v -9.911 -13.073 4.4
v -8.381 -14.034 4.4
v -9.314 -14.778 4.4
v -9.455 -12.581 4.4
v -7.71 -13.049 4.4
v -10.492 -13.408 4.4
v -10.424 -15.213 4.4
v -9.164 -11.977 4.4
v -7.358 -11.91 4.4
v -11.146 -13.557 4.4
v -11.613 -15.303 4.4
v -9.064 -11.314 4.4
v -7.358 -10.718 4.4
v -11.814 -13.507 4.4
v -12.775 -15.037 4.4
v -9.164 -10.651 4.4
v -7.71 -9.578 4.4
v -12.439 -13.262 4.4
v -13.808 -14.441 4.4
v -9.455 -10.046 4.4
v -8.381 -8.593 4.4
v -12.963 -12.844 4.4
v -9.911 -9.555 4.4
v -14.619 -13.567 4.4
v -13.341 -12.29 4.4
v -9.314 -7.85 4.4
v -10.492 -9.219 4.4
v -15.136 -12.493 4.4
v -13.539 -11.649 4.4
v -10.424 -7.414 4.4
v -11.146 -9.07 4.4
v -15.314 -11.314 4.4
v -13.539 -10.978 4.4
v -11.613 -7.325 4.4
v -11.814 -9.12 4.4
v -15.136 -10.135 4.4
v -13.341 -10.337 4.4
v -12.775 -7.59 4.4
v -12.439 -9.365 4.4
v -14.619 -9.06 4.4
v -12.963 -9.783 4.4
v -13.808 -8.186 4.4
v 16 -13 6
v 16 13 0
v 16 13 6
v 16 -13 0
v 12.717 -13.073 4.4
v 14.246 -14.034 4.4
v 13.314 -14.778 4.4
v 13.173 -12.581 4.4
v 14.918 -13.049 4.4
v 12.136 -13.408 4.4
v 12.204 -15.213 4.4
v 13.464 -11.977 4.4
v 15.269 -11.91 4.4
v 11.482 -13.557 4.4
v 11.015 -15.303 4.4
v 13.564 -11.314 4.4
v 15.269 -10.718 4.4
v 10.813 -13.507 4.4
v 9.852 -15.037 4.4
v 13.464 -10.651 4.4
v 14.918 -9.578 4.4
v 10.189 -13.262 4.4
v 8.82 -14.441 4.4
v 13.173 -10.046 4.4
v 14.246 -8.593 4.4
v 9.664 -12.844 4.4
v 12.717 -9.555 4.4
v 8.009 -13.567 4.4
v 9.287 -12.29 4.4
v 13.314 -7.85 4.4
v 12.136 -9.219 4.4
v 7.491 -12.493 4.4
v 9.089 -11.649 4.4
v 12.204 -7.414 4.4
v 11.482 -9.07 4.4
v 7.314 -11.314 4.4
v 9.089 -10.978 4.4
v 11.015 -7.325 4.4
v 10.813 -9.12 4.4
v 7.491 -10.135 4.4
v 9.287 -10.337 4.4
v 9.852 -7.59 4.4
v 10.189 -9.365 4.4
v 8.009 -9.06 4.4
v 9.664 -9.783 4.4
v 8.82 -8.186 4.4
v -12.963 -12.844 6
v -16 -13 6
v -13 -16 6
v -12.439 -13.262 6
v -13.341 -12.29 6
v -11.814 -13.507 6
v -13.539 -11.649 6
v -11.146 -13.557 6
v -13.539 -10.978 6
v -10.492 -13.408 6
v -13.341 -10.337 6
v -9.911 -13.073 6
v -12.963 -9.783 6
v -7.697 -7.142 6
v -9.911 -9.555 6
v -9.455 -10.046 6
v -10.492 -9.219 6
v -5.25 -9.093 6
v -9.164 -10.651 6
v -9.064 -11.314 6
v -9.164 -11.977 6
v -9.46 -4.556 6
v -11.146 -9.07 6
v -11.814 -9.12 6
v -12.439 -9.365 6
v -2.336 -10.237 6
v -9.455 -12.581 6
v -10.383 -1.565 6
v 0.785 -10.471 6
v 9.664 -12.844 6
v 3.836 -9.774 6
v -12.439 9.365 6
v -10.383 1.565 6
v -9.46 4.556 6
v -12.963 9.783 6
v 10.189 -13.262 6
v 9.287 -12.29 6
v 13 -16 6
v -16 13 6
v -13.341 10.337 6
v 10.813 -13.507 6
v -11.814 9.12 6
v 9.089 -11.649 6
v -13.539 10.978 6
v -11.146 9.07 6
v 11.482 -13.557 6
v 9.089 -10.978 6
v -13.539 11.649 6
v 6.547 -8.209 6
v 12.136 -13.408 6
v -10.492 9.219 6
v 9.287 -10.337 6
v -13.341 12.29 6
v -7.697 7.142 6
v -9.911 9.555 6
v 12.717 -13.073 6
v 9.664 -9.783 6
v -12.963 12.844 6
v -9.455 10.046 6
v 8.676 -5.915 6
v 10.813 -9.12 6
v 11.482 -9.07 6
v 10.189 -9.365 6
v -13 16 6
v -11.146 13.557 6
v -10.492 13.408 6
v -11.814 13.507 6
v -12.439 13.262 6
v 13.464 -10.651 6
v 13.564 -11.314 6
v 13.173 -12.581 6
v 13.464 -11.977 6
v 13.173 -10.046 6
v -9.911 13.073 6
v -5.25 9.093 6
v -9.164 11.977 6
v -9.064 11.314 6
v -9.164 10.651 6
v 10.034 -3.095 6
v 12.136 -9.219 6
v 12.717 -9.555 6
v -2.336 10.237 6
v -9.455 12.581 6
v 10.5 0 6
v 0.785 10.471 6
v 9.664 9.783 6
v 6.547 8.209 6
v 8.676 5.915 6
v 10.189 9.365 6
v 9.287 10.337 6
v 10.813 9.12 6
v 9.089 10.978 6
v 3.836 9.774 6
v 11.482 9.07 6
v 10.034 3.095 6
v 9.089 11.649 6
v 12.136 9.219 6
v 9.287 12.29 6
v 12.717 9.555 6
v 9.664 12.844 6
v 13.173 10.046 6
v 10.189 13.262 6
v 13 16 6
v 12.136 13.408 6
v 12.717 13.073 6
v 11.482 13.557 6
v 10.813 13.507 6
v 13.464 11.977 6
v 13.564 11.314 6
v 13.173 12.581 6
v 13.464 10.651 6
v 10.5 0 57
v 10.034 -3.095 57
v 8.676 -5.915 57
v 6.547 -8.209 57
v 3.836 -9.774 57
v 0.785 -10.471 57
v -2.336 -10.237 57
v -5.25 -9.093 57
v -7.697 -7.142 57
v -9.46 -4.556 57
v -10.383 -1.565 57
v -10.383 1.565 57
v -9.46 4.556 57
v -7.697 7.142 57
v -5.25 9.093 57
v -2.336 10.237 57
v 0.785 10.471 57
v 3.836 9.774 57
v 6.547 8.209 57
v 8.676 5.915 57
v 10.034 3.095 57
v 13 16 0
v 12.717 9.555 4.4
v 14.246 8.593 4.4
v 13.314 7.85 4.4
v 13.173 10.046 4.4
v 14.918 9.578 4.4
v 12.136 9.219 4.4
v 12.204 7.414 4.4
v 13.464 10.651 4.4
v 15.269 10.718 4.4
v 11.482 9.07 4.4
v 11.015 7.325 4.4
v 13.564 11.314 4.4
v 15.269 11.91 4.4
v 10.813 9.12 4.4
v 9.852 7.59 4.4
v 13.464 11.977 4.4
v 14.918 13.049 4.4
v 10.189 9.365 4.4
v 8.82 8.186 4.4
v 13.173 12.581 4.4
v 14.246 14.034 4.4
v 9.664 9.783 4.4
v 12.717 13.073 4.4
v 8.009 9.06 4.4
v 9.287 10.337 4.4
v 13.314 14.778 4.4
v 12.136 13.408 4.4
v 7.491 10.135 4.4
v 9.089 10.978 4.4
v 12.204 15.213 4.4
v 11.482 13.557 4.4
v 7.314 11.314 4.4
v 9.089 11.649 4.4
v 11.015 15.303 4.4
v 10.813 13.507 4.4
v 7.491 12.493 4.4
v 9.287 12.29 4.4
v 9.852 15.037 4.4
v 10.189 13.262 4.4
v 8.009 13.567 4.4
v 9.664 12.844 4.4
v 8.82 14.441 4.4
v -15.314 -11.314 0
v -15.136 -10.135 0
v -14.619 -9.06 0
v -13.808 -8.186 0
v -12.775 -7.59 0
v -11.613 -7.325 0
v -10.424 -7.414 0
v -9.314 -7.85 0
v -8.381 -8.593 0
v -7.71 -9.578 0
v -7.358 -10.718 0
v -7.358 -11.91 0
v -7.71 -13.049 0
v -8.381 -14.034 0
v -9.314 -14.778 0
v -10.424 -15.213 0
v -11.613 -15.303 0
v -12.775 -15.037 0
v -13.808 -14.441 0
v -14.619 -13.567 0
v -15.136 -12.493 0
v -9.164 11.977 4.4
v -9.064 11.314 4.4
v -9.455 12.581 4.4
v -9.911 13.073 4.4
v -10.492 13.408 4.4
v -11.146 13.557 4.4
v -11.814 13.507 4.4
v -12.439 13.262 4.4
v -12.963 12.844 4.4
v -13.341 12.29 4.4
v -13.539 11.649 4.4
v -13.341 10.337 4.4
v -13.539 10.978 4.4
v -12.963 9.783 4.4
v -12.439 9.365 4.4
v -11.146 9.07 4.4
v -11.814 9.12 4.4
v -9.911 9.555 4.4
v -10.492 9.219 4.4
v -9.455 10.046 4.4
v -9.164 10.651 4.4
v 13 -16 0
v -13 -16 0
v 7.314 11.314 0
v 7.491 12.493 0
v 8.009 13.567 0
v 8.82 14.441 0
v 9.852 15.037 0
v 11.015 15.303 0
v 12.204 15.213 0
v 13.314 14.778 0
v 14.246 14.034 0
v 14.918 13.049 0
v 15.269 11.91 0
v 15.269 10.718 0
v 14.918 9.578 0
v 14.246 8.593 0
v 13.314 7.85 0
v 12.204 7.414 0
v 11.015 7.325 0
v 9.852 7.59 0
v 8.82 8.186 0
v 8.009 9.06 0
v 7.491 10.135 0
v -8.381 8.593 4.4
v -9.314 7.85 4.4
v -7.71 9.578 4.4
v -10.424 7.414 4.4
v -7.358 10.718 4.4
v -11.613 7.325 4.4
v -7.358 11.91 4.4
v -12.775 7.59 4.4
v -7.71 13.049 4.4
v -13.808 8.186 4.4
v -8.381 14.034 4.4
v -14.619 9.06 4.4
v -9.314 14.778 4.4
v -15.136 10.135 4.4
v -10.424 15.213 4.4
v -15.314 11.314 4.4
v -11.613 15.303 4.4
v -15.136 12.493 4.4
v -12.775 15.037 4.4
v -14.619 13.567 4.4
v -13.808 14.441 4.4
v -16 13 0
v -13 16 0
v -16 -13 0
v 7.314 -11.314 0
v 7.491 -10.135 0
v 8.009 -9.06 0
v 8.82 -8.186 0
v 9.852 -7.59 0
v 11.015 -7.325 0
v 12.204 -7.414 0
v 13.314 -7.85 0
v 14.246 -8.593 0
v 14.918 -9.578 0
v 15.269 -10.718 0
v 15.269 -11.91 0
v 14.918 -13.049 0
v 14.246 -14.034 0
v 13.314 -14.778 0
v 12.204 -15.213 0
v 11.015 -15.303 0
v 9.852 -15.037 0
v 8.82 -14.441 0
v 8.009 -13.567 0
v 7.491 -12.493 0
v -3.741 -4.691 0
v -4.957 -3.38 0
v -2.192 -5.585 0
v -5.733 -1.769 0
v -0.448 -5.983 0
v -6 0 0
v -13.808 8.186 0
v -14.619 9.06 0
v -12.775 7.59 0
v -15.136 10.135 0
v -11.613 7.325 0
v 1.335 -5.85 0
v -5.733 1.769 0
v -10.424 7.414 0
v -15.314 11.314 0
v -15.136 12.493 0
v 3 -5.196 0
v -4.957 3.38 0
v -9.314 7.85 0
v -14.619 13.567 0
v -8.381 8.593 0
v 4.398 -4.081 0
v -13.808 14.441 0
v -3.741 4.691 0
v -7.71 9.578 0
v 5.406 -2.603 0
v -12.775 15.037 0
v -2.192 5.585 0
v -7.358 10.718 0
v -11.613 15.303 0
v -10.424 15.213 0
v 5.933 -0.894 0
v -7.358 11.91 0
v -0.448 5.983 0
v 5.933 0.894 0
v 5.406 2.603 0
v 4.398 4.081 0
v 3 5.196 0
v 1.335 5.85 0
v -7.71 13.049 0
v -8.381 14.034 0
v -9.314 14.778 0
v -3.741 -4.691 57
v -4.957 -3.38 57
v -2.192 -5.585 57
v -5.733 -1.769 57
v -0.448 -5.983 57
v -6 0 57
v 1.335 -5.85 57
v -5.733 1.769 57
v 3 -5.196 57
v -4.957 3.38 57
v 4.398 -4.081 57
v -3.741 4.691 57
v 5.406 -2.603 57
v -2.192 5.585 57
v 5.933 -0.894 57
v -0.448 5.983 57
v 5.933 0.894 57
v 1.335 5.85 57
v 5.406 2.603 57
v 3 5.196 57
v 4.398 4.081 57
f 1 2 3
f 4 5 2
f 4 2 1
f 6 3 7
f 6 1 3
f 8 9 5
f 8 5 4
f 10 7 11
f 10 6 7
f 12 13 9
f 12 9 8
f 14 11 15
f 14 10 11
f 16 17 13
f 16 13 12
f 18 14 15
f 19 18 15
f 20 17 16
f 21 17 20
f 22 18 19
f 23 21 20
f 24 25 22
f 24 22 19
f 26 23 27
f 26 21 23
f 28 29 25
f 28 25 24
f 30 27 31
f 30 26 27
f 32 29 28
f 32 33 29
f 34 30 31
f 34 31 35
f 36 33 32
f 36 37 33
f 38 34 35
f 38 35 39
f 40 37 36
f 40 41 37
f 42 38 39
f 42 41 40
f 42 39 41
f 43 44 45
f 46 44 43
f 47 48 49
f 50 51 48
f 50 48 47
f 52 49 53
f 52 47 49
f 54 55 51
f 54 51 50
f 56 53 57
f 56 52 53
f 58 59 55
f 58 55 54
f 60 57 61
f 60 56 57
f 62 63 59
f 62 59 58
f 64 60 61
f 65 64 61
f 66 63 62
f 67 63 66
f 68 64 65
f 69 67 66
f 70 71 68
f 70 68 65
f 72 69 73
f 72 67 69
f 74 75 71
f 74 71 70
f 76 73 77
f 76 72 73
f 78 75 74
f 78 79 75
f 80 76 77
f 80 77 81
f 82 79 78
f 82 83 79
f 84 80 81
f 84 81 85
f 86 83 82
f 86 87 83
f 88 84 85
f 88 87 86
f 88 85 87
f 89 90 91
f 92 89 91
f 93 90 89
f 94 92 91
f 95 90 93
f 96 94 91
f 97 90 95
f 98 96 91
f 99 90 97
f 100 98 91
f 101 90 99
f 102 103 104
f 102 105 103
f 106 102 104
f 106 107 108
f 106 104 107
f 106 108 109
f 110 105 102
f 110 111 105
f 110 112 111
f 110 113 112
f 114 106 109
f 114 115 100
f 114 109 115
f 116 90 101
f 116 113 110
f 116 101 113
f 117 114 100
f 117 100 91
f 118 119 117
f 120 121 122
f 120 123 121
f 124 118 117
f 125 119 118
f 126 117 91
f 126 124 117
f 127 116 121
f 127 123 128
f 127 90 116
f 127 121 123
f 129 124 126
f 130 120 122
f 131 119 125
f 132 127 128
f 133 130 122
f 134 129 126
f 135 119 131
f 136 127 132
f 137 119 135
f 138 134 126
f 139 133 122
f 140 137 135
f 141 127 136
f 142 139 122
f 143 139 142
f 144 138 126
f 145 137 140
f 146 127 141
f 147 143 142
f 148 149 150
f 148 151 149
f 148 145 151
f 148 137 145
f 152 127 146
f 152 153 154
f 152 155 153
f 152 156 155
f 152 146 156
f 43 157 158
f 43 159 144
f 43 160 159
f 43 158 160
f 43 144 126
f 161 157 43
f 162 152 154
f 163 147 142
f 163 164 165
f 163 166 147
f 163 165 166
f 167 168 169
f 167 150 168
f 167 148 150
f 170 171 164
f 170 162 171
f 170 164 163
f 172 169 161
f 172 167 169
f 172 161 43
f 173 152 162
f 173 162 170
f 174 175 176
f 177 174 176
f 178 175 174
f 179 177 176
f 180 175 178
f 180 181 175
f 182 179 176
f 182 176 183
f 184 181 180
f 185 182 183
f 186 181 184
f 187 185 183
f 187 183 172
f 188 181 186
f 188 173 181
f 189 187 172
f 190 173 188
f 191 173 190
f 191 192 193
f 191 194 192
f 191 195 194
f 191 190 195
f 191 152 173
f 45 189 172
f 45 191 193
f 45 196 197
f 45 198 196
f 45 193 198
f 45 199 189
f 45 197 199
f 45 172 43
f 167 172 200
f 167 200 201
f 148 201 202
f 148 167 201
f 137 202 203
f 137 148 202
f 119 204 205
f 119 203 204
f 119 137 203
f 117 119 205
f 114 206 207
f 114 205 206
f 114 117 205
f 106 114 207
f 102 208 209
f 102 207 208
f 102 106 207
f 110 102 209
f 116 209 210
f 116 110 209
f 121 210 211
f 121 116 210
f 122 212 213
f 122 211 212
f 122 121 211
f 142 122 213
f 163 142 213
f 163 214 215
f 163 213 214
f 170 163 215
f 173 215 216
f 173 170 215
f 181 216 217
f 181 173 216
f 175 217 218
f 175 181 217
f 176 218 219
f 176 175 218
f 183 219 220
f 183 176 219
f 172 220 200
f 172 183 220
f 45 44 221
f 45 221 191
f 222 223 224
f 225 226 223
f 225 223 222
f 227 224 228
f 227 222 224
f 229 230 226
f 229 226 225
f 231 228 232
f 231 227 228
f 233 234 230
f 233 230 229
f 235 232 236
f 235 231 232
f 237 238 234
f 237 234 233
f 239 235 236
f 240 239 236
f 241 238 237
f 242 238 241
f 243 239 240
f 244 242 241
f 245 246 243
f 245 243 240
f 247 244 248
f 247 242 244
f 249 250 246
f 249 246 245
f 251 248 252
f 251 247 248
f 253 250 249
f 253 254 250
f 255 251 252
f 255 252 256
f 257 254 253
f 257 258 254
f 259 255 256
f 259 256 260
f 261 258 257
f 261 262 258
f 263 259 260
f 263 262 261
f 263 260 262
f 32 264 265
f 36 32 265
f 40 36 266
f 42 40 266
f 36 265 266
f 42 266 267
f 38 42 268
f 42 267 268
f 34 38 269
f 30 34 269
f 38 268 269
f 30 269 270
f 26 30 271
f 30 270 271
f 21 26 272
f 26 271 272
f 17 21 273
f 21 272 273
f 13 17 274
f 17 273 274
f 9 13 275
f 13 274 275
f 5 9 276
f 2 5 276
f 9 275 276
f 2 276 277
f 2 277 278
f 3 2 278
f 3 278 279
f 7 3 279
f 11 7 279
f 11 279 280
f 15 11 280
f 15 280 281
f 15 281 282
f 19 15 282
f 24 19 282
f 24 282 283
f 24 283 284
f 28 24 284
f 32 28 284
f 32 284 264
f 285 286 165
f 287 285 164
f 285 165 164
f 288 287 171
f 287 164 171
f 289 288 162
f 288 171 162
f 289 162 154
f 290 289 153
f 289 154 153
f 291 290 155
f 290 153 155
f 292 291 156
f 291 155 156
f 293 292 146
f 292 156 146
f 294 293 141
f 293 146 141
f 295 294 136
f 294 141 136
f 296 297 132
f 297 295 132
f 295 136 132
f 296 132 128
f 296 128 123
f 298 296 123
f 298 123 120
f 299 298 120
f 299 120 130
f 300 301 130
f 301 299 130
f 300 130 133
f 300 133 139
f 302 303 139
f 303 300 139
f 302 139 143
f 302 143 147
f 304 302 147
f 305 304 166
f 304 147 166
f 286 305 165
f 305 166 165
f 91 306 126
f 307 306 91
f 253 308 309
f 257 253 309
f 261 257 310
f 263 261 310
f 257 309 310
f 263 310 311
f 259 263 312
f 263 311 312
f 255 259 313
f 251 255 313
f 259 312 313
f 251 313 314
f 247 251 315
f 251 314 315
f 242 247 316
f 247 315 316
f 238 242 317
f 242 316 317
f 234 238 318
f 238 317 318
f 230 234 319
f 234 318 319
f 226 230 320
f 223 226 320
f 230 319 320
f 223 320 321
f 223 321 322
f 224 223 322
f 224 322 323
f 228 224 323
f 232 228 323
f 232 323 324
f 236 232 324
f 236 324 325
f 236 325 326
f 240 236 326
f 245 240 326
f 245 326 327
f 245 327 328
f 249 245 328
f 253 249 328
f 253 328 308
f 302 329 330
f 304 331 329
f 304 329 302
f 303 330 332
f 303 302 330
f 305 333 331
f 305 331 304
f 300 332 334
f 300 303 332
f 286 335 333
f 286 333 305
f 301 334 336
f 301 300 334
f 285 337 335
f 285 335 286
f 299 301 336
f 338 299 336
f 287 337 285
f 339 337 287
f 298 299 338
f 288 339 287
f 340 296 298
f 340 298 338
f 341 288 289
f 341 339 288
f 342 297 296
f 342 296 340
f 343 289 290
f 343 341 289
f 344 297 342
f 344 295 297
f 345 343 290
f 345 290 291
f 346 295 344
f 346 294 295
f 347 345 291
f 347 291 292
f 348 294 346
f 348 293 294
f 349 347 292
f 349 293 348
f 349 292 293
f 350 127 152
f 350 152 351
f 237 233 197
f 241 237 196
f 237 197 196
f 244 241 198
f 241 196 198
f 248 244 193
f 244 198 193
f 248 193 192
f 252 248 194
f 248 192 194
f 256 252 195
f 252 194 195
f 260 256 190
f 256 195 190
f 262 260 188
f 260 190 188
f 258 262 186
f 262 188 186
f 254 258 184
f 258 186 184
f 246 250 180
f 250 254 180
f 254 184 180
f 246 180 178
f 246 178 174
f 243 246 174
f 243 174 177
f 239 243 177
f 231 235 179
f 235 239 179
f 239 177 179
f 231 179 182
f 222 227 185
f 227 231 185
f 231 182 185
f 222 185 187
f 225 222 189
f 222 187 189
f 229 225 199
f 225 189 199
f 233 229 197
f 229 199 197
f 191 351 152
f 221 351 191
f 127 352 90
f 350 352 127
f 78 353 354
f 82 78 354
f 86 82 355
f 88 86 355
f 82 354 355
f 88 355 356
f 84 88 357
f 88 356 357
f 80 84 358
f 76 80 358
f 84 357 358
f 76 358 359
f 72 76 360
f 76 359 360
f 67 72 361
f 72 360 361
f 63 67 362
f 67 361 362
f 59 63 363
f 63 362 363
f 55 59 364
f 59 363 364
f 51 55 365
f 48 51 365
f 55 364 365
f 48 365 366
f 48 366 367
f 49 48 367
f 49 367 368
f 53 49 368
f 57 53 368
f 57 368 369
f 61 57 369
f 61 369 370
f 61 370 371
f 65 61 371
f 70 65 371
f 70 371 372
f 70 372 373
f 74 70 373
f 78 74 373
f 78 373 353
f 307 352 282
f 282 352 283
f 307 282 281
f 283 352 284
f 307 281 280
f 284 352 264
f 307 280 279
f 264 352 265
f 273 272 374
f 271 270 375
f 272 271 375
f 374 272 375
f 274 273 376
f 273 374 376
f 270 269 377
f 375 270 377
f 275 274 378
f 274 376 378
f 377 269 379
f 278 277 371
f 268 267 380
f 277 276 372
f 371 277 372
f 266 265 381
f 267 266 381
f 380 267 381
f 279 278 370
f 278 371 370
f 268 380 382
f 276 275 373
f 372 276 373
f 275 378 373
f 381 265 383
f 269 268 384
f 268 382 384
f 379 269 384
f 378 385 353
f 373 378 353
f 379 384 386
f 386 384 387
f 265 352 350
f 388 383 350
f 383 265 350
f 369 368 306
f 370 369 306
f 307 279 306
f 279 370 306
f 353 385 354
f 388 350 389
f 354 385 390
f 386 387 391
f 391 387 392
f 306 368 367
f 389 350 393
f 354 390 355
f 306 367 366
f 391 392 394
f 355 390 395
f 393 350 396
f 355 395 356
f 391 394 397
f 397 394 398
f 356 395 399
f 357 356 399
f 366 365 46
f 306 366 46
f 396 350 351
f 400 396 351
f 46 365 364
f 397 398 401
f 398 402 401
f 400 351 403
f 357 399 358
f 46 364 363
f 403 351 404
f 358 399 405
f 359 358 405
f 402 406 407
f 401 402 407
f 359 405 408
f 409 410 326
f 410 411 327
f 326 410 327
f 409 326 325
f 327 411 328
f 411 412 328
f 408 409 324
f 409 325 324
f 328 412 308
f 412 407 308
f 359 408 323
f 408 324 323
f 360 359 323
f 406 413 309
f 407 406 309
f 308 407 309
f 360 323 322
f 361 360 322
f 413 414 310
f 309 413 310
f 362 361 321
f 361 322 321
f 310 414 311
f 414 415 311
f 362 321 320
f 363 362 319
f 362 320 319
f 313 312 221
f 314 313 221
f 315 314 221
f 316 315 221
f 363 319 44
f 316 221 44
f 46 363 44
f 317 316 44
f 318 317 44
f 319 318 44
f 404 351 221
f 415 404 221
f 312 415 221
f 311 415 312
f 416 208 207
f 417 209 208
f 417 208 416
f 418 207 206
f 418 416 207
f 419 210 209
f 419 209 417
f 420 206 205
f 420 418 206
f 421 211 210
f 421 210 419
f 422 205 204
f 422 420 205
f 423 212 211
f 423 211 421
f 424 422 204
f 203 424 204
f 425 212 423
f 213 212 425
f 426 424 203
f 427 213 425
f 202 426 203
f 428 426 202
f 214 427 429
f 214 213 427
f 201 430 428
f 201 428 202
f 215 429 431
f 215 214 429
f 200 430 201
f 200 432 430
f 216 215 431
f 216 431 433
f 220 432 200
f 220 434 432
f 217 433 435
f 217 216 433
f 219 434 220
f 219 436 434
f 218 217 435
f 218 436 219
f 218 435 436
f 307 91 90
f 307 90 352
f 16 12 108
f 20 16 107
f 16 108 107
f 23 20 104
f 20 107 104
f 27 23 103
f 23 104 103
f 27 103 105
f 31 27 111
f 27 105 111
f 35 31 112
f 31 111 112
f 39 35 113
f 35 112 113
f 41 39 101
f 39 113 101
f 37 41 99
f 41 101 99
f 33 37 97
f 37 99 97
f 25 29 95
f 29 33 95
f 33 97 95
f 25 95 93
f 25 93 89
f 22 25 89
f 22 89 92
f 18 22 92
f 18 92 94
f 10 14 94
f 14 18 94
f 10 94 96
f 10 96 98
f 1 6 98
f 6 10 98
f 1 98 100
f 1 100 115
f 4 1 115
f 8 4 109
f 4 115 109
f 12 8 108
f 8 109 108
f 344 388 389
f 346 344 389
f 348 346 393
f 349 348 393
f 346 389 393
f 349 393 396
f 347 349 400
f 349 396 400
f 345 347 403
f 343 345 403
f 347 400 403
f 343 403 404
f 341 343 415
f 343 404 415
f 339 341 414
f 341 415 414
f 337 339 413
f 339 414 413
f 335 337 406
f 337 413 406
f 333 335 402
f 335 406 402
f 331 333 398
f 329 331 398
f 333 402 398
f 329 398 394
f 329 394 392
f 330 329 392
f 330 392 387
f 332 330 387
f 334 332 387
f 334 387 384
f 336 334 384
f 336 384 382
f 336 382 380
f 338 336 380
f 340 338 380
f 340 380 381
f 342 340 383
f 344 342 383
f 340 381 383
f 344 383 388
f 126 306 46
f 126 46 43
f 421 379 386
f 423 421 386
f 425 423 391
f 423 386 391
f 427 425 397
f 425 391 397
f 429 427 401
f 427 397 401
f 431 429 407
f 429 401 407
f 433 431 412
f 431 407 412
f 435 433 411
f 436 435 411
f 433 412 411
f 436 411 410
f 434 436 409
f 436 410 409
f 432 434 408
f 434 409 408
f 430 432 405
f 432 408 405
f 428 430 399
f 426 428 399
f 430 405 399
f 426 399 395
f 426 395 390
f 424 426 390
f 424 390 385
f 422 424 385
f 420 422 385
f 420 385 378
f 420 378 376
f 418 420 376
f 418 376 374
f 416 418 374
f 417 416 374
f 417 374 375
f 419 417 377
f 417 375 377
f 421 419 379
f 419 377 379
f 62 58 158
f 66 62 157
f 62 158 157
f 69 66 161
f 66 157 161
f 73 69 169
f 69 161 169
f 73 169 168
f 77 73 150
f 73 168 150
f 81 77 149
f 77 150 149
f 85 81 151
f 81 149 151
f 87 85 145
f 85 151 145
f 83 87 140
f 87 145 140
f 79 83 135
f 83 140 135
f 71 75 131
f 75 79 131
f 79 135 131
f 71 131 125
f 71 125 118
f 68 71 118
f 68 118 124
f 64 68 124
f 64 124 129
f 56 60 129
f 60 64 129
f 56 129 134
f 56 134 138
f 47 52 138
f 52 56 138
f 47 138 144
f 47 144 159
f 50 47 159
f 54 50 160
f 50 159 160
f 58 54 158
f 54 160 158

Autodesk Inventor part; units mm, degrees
ref_plane "YZ Plane" through (0, 0, 0) normal (1, 0, 0) x (0, 1, 0)
ref_plane "XZ Plane" through (0, 0, 0) normal (0, 1, 0) x (-1, 0, 0)
ref_plane "XY Plane" through (0, 0, 0) normal (0, 0, 1) x (1, 0, 0)
sketch "Sketch1" plane through (0, 0, 0) normal (0, 0, 1) x (1, 0, 0)
  line L0 (-16, 16) -> (16, 16)
  line L1 (16, 16) -> (16, -16)
  line L2 (16, -16) -> (-16, -16)
  line L3 (-16, -16) -> (-16, 16)
  point P0 (0, 0)
  dimension "d0" = 32
  dimension "d1" = 32
  dimension "d2" = 16
  dimension "d3" = 16
extrude "Firkant" add sketch "Sketch1" along normal blind 6
sketch "Sketch2" plane through (0, 0, 6) normal (0, 0, 1) x (1, 0, 0)
  circle A0 centre (0, 0) radius 10.5
  dimension "d6" = 21
extrude "Rør" add sketch "Sketch2" along normal blind 51
sketch "Sketch3" plane through (0, 0, 0) normal (0, 0, -1) x (-1, 0, 0)
  circle A0 centre (0, 0) radius 6
  dimension "d9" = 12
extrude "Hul" cut sketch "Sketch3" against normal up to surface (57 mm away)
sketch "Sketch4" plane through (0, 0, 6) normal (0, 0, 1) x (1, 0, 0)
  circle A0 centre (0, 0) radius 10.5 construction
  circle A1 centre (0, 0) radius 16 construction
  line L0 (-16, 16) -> (16, -16) construction
  line L1 (16, 16) -> (-16, -16) construction
  circle A2 centre (11.3137, 11.3137) radius 2.25
  circle A3 centre (-11.3137, 11.3137) radius 2.25
  circle A4 centre (-11.3137, -11.3137) radius 2.25
  circle A5 centre (11.3137, -11.3137) radius 2.25
  dimension "d12" = 32
  dimension "d13" = 4.5
  dimension "d14" = 4.5
  dimension "d15" = 4.5
  dimension "d16" = 4.5
extrude "d1 Hullerne (små)" cut sketch "Sketch4" against normal up to surface (6 mm away)
sketch "Sketch5" plane through (0, 0, 0) normal (0, 0, -1) x (-1, 0, 0)
  circle A0 centre (11.3137, -11.3137) radius 2.25 projected
  circle A1 centre (-11.3137, -11.3137) radius 2.25 projected
  circle A2 centre (11.3137, 11.3137) radius 2.25 projected
  circle A3 centre (-11.3137, 11.3137) radius 2.25 projected
  circle A4 centre (-11.3137, 11.3137) radius 4
  circle A5 centre (11.3137, 11.3137) radius 4
  circle A6 centre (11.3137, -11.3137) radius 4
  circle A7 centre (-11.3137, -11.3137) radius 4
  dimension "d19" = 8
  dimension "d20" = 8
  dimension "d21" = 8
  dimension "d22" = 8
extrude "d2 Hullerne (store)" cut sketch "Sketch5" against normal blind 4.4
chamfer "Hjørnerne" distance 3 angle 45 4 edges at (-16, -16, 3) (16, -16, 3) (16, 16, 3) (-16, 16, 3)
equation "\"d1\" = d0"
equation "\"d2\" = 0.5 * d0"
equation "\"d3\" = 0.5 * d1"
equation "\"d14\" = d13"
equation "\"d15\" = d13"
equation "\"d16\" = d13"
equation "\"d20\" = d19"
equation "\"d21\" = d19"
equation "\"d22\" = d19"
properties part number "Z-flange" material "Aluminum 6061"
